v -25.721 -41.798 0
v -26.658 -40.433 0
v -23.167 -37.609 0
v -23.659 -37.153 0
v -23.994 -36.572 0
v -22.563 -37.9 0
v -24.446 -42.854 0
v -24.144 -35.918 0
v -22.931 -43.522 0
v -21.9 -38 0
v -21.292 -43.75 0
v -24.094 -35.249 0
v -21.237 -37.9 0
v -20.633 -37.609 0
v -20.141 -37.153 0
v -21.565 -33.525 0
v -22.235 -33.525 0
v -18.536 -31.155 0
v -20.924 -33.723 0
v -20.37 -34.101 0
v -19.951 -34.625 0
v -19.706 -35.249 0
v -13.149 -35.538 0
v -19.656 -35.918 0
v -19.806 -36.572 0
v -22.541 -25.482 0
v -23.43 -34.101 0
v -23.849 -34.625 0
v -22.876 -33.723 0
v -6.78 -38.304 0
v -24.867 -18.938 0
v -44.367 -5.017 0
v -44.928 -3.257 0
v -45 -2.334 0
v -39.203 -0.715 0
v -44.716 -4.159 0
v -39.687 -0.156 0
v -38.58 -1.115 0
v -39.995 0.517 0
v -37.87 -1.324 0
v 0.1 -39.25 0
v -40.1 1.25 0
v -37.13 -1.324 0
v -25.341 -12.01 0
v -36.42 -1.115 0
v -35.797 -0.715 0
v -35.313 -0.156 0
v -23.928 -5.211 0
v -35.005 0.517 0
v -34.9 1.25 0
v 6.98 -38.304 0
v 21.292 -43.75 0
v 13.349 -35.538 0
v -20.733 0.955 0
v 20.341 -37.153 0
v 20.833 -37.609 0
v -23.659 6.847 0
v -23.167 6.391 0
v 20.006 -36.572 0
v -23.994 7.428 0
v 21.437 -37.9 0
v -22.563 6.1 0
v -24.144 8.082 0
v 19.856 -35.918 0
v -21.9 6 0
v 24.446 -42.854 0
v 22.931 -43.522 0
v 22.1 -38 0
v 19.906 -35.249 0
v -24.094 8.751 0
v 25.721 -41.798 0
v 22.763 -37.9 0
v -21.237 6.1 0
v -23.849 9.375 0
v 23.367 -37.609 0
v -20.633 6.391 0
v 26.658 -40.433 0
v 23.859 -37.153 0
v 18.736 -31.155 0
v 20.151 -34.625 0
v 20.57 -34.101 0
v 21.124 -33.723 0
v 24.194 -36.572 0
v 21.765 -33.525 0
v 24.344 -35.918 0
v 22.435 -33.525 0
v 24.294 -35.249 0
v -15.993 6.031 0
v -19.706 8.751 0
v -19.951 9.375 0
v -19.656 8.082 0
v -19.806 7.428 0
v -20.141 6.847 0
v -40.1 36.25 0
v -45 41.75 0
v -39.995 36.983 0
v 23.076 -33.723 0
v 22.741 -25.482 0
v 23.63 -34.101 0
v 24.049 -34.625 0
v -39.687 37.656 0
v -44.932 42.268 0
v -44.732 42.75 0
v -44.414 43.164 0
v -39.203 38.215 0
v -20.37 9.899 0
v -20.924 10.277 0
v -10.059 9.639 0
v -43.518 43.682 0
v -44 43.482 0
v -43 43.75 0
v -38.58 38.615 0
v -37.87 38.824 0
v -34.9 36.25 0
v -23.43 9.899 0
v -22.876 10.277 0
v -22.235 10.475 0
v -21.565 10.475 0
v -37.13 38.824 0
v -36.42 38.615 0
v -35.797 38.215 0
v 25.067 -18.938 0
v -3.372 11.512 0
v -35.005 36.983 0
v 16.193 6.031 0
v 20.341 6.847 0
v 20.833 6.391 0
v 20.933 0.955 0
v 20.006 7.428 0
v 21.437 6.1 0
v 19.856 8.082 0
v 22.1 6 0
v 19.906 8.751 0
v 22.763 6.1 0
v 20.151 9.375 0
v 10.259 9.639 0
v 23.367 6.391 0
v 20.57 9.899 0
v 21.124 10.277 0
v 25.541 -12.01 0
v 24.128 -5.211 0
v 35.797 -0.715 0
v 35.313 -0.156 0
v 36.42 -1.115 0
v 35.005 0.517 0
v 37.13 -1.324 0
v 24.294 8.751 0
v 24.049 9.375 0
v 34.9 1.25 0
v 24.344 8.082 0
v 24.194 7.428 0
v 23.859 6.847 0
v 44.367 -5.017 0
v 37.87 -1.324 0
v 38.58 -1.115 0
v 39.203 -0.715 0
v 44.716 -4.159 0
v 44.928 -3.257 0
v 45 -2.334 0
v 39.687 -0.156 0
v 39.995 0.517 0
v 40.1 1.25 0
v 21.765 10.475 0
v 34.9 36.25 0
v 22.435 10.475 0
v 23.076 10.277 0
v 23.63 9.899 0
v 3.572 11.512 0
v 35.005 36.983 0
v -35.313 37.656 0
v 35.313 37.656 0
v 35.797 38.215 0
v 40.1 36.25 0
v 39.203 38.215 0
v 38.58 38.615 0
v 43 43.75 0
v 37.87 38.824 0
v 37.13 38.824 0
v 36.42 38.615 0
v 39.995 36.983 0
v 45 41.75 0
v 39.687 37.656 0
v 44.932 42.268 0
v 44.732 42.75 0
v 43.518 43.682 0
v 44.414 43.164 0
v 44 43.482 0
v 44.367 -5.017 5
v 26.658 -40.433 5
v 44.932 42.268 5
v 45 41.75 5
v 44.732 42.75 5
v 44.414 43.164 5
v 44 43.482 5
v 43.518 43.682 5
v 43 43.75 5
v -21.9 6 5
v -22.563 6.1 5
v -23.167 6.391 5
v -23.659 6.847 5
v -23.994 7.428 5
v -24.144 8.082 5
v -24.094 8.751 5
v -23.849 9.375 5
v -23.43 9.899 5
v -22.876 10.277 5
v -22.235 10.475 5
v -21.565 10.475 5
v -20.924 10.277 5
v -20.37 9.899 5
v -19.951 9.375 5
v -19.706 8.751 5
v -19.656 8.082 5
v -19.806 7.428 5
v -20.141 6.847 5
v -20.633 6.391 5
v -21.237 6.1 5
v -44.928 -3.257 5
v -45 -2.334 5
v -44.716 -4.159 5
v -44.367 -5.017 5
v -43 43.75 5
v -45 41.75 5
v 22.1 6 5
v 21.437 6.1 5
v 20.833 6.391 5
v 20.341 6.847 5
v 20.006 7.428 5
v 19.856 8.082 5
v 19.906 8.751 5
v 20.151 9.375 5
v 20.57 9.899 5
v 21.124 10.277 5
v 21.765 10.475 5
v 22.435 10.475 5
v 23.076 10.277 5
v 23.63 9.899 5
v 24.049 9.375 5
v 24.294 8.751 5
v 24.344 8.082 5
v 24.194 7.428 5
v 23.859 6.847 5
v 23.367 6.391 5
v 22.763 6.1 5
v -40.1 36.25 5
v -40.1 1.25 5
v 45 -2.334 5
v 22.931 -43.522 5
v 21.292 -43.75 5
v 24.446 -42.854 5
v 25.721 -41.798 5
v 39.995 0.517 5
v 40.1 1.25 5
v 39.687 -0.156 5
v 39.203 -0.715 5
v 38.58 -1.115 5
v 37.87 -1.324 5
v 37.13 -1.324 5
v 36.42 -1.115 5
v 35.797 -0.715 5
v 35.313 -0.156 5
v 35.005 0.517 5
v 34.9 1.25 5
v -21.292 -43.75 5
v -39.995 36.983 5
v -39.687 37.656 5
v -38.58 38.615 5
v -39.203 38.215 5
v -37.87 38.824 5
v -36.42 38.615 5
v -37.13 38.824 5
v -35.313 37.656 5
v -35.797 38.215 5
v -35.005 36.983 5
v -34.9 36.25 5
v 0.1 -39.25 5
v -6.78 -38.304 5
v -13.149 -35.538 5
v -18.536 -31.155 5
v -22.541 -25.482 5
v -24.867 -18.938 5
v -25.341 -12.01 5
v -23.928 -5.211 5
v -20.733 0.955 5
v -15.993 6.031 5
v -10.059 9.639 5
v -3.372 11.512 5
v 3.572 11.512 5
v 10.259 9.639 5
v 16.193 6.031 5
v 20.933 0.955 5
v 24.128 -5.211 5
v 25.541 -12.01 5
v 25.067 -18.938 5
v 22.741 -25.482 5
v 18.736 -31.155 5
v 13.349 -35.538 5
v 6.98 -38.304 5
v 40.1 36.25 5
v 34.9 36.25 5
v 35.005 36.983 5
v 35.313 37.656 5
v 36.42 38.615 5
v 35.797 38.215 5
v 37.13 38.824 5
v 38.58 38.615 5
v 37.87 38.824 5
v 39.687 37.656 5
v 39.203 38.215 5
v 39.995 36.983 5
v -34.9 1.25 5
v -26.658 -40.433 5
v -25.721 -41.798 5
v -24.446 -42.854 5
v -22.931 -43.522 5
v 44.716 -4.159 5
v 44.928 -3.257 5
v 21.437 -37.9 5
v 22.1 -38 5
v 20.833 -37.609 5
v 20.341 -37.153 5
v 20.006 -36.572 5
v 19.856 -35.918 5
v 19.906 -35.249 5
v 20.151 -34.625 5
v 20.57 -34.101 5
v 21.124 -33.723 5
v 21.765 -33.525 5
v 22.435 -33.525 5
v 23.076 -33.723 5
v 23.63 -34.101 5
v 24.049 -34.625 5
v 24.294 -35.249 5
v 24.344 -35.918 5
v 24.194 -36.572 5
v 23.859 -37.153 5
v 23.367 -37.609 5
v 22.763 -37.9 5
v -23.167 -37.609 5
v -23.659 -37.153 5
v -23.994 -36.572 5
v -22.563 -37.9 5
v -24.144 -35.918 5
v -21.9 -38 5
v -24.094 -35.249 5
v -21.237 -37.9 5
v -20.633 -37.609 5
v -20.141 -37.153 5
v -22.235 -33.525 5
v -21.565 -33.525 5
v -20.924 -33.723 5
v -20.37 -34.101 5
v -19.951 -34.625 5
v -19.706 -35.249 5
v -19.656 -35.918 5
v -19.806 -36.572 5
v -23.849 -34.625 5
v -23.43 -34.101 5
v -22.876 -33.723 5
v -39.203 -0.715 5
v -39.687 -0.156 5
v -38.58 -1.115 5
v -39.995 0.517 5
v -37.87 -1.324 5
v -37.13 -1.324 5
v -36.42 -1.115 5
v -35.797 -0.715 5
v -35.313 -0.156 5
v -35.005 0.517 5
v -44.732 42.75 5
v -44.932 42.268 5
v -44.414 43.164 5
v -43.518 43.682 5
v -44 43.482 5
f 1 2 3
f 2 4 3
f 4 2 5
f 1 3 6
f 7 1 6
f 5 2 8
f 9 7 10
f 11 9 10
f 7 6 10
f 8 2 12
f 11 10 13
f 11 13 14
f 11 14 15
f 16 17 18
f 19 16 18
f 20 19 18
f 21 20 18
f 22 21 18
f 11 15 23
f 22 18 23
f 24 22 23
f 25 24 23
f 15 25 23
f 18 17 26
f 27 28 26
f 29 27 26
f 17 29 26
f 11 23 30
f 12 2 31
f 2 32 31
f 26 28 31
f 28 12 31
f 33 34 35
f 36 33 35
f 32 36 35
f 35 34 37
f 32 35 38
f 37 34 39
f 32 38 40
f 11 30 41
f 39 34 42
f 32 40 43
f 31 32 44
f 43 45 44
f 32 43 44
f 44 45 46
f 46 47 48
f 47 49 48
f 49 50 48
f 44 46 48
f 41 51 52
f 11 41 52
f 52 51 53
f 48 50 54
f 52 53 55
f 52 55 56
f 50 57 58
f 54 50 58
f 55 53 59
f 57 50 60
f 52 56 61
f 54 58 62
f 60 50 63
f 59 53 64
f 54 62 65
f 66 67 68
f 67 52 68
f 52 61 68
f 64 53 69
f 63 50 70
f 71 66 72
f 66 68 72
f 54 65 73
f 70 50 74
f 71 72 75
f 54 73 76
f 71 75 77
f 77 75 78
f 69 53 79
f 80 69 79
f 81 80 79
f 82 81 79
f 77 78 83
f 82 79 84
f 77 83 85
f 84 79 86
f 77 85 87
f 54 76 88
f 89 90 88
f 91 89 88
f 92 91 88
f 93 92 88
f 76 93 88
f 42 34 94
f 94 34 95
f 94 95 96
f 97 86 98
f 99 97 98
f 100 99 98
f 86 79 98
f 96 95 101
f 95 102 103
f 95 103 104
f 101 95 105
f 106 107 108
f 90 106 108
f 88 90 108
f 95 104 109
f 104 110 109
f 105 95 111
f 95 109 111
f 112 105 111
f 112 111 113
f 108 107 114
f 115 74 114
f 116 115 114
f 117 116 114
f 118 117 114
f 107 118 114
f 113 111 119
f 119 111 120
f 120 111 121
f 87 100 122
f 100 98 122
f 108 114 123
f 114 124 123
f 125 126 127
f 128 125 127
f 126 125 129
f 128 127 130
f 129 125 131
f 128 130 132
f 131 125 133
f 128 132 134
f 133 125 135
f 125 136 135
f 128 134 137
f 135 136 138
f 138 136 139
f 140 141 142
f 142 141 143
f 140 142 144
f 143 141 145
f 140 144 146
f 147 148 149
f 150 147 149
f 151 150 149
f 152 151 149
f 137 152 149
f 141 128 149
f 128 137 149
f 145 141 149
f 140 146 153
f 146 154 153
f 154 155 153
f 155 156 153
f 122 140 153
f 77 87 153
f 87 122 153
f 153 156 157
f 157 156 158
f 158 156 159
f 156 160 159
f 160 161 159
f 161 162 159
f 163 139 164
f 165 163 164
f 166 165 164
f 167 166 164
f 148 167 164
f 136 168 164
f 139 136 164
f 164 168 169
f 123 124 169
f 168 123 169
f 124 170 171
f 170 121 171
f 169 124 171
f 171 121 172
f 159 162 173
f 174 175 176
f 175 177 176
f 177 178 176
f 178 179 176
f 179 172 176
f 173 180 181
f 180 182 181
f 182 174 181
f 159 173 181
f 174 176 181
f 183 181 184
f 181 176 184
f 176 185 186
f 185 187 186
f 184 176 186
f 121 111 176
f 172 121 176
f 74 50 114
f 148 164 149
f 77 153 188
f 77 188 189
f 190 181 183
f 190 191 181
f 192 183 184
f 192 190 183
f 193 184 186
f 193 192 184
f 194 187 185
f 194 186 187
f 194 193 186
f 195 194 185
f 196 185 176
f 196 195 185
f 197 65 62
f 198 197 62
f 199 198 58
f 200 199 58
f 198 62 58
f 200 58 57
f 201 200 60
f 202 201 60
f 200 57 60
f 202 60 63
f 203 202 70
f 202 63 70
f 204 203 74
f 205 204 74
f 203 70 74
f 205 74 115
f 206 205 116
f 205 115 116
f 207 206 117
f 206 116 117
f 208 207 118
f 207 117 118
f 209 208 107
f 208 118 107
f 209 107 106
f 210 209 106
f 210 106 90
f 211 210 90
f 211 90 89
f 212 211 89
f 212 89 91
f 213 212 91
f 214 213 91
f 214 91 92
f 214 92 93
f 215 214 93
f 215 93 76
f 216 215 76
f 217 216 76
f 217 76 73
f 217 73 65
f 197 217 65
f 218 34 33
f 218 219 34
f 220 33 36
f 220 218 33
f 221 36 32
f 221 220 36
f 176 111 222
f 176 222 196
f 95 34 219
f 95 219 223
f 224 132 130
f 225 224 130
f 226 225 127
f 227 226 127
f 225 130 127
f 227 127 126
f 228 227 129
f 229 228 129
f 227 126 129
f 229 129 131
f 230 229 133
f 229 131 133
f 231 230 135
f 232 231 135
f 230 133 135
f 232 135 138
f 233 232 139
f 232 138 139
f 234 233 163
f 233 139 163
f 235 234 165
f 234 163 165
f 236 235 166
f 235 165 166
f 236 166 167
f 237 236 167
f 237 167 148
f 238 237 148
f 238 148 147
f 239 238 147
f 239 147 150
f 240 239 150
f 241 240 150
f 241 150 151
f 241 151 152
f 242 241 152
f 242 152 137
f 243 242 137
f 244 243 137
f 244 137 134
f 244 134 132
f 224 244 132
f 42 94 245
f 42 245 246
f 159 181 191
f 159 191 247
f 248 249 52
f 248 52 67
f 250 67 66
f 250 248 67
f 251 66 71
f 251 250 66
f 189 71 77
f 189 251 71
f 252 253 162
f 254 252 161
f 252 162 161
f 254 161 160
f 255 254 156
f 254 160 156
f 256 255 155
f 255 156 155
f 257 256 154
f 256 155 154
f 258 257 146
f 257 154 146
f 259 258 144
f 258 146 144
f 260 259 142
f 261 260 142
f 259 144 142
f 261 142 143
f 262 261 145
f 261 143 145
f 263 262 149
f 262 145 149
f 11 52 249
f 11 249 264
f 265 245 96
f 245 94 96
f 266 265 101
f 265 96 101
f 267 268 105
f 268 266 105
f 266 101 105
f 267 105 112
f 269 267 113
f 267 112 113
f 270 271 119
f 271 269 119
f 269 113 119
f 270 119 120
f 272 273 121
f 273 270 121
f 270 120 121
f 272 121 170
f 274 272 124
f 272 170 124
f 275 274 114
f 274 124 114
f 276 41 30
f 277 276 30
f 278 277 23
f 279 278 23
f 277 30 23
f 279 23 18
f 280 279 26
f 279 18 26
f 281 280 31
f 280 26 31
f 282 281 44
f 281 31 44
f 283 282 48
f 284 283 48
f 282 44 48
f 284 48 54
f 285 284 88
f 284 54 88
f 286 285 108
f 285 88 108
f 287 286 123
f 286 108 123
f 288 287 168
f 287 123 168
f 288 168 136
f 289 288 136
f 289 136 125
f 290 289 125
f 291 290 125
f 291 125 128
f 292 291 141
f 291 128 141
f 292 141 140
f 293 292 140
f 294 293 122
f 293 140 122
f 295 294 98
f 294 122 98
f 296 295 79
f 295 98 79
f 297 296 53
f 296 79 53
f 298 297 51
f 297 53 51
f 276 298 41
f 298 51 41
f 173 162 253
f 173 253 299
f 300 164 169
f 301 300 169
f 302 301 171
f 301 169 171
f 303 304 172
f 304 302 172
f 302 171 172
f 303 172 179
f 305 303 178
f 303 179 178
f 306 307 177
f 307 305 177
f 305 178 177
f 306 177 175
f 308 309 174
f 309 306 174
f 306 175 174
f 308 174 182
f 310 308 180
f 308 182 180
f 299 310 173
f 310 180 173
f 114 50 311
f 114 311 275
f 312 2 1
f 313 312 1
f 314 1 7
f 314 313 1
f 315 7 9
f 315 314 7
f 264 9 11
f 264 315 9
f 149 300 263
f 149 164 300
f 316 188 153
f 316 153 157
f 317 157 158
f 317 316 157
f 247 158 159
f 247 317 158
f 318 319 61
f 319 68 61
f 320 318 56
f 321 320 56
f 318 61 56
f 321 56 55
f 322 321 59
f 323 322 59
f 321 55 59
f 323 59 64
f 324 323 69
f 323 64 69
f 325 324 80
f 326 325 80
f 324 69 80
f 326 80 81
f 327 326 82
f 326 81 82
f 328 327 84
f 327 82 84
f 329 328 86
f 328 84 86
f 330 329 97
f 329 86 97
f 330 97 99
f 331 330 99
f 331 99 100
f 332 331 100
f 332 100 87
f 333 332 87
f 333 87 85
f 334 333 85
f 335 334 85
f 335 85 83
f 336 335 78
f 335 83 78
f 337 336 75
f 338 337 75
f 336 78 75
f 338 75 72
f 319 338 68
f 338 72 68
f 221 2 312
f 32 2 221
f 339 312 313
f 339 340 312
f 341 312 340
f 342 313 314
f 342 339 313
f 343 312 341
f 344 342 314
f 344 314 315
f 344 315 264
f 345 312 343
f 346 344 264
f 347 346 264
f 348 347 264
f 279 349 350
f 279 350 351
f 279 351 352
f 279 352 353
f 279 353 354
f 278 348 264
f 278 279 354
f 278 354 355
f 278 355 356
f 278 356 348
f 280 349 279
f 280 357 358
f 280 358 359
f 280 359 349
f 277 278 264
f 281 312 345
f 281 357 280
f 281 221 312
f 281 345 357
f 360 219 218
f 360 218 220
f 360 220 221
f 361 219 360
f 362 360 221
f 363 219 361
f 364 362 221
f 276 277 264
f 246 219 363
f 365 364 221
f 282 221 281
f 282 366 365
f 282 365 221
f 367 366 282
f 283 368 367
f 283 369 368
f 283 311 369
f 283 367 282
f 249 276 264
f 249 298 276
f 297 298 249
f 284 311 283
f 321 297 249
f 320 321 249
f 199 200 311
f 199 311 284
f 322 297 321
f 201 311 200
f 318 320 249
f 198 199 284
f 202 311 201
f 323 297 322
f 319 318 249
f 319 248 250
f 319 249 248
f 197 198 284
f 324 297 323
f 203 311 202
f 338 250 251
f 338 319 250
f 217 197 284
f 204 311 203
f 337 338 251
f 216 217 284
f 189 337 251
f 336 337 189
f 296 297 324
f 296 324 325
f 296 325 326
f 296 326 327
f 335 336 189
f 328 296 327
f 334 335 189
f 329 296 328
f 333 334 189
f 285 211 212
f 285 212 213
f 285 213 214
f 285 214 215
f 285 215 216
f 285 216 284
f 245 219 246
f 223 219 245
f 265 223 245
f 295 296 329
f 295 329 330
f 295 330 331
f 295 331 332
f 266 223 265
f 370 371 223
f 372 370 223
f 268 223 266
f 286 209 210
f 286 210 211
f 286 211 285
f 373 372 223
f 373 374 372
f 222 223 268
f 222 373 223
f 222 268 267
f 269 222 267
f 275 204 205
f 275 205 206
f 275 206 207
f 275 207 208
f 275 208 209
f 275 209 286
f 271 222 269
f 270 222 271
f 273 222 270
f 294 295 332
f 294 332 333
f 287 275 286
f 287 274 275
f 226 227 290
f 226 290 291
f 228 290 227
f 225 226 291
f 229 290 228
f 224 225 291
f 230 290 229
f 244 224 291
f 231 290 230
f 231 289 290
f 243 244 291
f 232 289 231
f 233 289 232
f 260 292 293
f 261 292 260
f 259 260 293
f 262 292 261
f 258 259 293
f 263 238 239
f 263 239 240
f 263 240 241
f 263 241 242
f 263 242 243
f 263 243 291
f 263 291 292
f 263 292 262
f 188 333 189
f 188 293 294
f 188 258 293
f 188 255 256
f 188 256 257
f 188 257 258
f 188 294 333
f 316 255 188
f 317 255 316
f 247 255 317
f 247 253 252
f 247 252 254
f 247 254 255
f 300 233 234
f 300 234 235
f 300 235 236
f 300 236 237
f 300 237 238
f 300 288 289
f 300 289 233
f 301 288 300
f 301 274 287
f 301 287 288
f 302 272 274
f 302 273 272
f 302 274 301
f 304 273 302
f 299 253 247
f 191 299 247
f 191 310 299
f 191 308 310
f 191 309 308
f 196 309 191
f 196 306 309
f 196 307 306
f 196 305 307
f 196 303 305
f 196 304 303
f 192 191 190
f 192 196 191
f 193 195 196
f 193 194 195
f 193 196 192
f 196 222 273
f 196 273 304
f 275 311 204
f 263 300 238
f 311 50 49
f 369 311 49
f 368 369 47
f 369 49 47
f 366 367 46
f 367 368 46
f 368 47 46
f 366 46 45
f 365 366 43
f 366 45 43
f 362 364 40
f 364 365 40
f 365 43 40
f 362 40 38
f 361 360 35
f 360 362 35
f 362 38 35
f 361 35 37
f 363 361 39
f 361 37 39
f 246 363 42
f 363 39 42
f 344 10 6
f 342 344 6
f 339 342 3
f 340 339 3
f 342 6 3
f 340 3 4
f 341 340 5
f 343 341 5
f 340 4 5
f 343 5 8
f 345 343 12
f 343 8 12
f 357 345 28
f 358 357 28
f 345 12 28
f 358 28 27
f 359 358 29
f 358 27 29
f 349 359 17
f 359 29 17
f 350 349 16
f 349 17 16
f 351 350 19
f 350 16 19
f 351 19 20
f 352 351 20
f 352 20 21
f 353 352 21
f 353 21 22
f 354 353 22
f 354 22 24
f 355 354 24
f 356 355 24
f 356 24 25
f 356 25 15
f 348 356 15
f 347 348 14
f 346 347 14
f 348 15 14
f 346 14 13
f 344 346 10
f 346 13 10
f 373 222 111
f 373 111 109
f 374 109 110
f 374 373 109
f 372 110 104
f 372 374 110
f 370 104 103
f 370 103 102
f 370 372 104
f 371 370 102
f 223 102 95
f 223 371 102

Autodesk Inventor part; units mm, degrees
ref_plane "YZ Plane" through (0, 0, 0) normal (1, 0, 0) x (0, 1, 0)
ref_plane "XZ Plane" through (0, 0, 0) normal (0, 1, 0) x (-1, 0, 0)
ref_plane "XY Plane" through (0, 0, 0) normal (0, 0, 1) x (1, 0, 0)
sketch "Sketch1" plane through (0, 0, 0) normal (0, 0, 1) x (1, 0, 0)
  line L0 (-45, 43.75) -> (45, 43.75)
  line L1 (45, 43.75) -> (45, -3.75)
  line L2 (45, -3.75) -> (25, -43.75)
  line L3 (25, -43.75) -> (-25, -43.75)
  line L4 (-25, -43.75) -> (-45, -3.75)
  line L5 (-45, -3.75) -> (-45, 43.75)
  line L6 (0, 53.6312) -> (0, 0)
  line L7 (0, 0) -> (107.3954, 0)
  line L8 (-37.5, 36.25) -> (-37.5, 1.25) construction
  line L9 (-40.1, 36.25) -> (-40.1, 1.25)
  line L10 (-34.9, 1.25) -> (-34.9, 36.25)
  arc A0 (-34.9, 36.25) -> (-40.1, 36.25) centre (-37.5, 36.25) ccw
  arc A1 (-40.1, 1.25) -> (-34.9, 1.25) centre (-37.5, 1.25) ccw
  line L11 (37.5, 36.25) -> (37.5, 1.25) construction
  line L12 (34.9, 36.25) -> (34.9, 1.25)
  line L13 (40.1, 1.25) -> (40.1, 36.25)
  arc A2 (40.1, 36.25) -> (34.9, 36.25) centre (37.5, 36.25) ccw
  arc A3 (34.9, 1.25) -> (40.1, 1.25) centre (37.5, 1.25) ccw
  line L14 (-37.5, 36.25) -> (167.5, 36.25) construction
  point P0 (-37.5, 18.75)
  point P1 (37.5, 18.75)
  dimension "d1" = 87.5
  dimension "d2" = 47.5
  dimension "d3" = 2.6
  dimension "d4" = 35
  dimension "d5" = 7.5
  dimension "d6" = 7.5
  dimension "d7" = 75
  dimension "d9" = 20
  dimension "d40" = 7.5
  dimension "d41" = 5.2
  dimension "d42" = 5.2
  dimension "d45" = 42.5
extrude "Extrusion1" add sketch "Sketch1" along normal blind 5 contours L0 L6 L7 A3 L1 L2 L3 L4 L5 | L0 L1 L7 A3 L13 A2 L12 L6
fillet "Fillet1" radius 2 2 edges at (-45, 43.75, 2.5) (45, 43.75, 2.5)
sketch "Sketch2" plane through (0, 0, 5) normal (0, 0, 1) x (1, 0, 0)
  line L0 (0.1, -13.75) -> (0.1, 26.1696) construction
  line L1 (-34.9, 36.25) -> (-34.9, 1.25) projected
  line L2 (-25, -43.75) -> (25, -43.75) projected
  point P0 (0, 0)
  point P1 (-23.7639, -52.5)
  point P2 (23.7639, -52.5)
  dimension "d23" = 35
  dimension "d24" = 30
hole "Hole1" at (0.1, -13.75, 5) direction (0, 0, -1) diameter 51 end through all
sketch "Sketch3" plane through (0, 0, 5) normal (0, 0, 1) x (1, 0, 0)
  circle A0 centre (0.1, -13.75) radius 25.5 projected
  point P0 (0, 0)
  point P1 (-21.9, 8.25)
  dimension "d32" = 22
  dimension "d33" = 22
hole "Hole2" at (-21.9, 8.25, 5) direction (0, 0, -1) diameter 4.5 end through all
pattern_linear "Rectangular Pattern2" count 2 spacing 44 along (1, 0, 0) count 2 spacing 44 along (0, -1, 0) of "Hole2"
fillet "Rundung2" radius 6 4 edges at (45, -3.75, 2.5) (25, -43.75, 2.5) (-25, -43.75, 2.5) (-45, -3.75, 2.5)
equation "\"d6\" = d5"
equation "\"d33\" = d32"
equation "\"d36\" = 2 * d32"
equation "\"d39\" = 2 * d32"
properties part number "103.006.01_Dosiereinheit_Rahmenaufnahme"
